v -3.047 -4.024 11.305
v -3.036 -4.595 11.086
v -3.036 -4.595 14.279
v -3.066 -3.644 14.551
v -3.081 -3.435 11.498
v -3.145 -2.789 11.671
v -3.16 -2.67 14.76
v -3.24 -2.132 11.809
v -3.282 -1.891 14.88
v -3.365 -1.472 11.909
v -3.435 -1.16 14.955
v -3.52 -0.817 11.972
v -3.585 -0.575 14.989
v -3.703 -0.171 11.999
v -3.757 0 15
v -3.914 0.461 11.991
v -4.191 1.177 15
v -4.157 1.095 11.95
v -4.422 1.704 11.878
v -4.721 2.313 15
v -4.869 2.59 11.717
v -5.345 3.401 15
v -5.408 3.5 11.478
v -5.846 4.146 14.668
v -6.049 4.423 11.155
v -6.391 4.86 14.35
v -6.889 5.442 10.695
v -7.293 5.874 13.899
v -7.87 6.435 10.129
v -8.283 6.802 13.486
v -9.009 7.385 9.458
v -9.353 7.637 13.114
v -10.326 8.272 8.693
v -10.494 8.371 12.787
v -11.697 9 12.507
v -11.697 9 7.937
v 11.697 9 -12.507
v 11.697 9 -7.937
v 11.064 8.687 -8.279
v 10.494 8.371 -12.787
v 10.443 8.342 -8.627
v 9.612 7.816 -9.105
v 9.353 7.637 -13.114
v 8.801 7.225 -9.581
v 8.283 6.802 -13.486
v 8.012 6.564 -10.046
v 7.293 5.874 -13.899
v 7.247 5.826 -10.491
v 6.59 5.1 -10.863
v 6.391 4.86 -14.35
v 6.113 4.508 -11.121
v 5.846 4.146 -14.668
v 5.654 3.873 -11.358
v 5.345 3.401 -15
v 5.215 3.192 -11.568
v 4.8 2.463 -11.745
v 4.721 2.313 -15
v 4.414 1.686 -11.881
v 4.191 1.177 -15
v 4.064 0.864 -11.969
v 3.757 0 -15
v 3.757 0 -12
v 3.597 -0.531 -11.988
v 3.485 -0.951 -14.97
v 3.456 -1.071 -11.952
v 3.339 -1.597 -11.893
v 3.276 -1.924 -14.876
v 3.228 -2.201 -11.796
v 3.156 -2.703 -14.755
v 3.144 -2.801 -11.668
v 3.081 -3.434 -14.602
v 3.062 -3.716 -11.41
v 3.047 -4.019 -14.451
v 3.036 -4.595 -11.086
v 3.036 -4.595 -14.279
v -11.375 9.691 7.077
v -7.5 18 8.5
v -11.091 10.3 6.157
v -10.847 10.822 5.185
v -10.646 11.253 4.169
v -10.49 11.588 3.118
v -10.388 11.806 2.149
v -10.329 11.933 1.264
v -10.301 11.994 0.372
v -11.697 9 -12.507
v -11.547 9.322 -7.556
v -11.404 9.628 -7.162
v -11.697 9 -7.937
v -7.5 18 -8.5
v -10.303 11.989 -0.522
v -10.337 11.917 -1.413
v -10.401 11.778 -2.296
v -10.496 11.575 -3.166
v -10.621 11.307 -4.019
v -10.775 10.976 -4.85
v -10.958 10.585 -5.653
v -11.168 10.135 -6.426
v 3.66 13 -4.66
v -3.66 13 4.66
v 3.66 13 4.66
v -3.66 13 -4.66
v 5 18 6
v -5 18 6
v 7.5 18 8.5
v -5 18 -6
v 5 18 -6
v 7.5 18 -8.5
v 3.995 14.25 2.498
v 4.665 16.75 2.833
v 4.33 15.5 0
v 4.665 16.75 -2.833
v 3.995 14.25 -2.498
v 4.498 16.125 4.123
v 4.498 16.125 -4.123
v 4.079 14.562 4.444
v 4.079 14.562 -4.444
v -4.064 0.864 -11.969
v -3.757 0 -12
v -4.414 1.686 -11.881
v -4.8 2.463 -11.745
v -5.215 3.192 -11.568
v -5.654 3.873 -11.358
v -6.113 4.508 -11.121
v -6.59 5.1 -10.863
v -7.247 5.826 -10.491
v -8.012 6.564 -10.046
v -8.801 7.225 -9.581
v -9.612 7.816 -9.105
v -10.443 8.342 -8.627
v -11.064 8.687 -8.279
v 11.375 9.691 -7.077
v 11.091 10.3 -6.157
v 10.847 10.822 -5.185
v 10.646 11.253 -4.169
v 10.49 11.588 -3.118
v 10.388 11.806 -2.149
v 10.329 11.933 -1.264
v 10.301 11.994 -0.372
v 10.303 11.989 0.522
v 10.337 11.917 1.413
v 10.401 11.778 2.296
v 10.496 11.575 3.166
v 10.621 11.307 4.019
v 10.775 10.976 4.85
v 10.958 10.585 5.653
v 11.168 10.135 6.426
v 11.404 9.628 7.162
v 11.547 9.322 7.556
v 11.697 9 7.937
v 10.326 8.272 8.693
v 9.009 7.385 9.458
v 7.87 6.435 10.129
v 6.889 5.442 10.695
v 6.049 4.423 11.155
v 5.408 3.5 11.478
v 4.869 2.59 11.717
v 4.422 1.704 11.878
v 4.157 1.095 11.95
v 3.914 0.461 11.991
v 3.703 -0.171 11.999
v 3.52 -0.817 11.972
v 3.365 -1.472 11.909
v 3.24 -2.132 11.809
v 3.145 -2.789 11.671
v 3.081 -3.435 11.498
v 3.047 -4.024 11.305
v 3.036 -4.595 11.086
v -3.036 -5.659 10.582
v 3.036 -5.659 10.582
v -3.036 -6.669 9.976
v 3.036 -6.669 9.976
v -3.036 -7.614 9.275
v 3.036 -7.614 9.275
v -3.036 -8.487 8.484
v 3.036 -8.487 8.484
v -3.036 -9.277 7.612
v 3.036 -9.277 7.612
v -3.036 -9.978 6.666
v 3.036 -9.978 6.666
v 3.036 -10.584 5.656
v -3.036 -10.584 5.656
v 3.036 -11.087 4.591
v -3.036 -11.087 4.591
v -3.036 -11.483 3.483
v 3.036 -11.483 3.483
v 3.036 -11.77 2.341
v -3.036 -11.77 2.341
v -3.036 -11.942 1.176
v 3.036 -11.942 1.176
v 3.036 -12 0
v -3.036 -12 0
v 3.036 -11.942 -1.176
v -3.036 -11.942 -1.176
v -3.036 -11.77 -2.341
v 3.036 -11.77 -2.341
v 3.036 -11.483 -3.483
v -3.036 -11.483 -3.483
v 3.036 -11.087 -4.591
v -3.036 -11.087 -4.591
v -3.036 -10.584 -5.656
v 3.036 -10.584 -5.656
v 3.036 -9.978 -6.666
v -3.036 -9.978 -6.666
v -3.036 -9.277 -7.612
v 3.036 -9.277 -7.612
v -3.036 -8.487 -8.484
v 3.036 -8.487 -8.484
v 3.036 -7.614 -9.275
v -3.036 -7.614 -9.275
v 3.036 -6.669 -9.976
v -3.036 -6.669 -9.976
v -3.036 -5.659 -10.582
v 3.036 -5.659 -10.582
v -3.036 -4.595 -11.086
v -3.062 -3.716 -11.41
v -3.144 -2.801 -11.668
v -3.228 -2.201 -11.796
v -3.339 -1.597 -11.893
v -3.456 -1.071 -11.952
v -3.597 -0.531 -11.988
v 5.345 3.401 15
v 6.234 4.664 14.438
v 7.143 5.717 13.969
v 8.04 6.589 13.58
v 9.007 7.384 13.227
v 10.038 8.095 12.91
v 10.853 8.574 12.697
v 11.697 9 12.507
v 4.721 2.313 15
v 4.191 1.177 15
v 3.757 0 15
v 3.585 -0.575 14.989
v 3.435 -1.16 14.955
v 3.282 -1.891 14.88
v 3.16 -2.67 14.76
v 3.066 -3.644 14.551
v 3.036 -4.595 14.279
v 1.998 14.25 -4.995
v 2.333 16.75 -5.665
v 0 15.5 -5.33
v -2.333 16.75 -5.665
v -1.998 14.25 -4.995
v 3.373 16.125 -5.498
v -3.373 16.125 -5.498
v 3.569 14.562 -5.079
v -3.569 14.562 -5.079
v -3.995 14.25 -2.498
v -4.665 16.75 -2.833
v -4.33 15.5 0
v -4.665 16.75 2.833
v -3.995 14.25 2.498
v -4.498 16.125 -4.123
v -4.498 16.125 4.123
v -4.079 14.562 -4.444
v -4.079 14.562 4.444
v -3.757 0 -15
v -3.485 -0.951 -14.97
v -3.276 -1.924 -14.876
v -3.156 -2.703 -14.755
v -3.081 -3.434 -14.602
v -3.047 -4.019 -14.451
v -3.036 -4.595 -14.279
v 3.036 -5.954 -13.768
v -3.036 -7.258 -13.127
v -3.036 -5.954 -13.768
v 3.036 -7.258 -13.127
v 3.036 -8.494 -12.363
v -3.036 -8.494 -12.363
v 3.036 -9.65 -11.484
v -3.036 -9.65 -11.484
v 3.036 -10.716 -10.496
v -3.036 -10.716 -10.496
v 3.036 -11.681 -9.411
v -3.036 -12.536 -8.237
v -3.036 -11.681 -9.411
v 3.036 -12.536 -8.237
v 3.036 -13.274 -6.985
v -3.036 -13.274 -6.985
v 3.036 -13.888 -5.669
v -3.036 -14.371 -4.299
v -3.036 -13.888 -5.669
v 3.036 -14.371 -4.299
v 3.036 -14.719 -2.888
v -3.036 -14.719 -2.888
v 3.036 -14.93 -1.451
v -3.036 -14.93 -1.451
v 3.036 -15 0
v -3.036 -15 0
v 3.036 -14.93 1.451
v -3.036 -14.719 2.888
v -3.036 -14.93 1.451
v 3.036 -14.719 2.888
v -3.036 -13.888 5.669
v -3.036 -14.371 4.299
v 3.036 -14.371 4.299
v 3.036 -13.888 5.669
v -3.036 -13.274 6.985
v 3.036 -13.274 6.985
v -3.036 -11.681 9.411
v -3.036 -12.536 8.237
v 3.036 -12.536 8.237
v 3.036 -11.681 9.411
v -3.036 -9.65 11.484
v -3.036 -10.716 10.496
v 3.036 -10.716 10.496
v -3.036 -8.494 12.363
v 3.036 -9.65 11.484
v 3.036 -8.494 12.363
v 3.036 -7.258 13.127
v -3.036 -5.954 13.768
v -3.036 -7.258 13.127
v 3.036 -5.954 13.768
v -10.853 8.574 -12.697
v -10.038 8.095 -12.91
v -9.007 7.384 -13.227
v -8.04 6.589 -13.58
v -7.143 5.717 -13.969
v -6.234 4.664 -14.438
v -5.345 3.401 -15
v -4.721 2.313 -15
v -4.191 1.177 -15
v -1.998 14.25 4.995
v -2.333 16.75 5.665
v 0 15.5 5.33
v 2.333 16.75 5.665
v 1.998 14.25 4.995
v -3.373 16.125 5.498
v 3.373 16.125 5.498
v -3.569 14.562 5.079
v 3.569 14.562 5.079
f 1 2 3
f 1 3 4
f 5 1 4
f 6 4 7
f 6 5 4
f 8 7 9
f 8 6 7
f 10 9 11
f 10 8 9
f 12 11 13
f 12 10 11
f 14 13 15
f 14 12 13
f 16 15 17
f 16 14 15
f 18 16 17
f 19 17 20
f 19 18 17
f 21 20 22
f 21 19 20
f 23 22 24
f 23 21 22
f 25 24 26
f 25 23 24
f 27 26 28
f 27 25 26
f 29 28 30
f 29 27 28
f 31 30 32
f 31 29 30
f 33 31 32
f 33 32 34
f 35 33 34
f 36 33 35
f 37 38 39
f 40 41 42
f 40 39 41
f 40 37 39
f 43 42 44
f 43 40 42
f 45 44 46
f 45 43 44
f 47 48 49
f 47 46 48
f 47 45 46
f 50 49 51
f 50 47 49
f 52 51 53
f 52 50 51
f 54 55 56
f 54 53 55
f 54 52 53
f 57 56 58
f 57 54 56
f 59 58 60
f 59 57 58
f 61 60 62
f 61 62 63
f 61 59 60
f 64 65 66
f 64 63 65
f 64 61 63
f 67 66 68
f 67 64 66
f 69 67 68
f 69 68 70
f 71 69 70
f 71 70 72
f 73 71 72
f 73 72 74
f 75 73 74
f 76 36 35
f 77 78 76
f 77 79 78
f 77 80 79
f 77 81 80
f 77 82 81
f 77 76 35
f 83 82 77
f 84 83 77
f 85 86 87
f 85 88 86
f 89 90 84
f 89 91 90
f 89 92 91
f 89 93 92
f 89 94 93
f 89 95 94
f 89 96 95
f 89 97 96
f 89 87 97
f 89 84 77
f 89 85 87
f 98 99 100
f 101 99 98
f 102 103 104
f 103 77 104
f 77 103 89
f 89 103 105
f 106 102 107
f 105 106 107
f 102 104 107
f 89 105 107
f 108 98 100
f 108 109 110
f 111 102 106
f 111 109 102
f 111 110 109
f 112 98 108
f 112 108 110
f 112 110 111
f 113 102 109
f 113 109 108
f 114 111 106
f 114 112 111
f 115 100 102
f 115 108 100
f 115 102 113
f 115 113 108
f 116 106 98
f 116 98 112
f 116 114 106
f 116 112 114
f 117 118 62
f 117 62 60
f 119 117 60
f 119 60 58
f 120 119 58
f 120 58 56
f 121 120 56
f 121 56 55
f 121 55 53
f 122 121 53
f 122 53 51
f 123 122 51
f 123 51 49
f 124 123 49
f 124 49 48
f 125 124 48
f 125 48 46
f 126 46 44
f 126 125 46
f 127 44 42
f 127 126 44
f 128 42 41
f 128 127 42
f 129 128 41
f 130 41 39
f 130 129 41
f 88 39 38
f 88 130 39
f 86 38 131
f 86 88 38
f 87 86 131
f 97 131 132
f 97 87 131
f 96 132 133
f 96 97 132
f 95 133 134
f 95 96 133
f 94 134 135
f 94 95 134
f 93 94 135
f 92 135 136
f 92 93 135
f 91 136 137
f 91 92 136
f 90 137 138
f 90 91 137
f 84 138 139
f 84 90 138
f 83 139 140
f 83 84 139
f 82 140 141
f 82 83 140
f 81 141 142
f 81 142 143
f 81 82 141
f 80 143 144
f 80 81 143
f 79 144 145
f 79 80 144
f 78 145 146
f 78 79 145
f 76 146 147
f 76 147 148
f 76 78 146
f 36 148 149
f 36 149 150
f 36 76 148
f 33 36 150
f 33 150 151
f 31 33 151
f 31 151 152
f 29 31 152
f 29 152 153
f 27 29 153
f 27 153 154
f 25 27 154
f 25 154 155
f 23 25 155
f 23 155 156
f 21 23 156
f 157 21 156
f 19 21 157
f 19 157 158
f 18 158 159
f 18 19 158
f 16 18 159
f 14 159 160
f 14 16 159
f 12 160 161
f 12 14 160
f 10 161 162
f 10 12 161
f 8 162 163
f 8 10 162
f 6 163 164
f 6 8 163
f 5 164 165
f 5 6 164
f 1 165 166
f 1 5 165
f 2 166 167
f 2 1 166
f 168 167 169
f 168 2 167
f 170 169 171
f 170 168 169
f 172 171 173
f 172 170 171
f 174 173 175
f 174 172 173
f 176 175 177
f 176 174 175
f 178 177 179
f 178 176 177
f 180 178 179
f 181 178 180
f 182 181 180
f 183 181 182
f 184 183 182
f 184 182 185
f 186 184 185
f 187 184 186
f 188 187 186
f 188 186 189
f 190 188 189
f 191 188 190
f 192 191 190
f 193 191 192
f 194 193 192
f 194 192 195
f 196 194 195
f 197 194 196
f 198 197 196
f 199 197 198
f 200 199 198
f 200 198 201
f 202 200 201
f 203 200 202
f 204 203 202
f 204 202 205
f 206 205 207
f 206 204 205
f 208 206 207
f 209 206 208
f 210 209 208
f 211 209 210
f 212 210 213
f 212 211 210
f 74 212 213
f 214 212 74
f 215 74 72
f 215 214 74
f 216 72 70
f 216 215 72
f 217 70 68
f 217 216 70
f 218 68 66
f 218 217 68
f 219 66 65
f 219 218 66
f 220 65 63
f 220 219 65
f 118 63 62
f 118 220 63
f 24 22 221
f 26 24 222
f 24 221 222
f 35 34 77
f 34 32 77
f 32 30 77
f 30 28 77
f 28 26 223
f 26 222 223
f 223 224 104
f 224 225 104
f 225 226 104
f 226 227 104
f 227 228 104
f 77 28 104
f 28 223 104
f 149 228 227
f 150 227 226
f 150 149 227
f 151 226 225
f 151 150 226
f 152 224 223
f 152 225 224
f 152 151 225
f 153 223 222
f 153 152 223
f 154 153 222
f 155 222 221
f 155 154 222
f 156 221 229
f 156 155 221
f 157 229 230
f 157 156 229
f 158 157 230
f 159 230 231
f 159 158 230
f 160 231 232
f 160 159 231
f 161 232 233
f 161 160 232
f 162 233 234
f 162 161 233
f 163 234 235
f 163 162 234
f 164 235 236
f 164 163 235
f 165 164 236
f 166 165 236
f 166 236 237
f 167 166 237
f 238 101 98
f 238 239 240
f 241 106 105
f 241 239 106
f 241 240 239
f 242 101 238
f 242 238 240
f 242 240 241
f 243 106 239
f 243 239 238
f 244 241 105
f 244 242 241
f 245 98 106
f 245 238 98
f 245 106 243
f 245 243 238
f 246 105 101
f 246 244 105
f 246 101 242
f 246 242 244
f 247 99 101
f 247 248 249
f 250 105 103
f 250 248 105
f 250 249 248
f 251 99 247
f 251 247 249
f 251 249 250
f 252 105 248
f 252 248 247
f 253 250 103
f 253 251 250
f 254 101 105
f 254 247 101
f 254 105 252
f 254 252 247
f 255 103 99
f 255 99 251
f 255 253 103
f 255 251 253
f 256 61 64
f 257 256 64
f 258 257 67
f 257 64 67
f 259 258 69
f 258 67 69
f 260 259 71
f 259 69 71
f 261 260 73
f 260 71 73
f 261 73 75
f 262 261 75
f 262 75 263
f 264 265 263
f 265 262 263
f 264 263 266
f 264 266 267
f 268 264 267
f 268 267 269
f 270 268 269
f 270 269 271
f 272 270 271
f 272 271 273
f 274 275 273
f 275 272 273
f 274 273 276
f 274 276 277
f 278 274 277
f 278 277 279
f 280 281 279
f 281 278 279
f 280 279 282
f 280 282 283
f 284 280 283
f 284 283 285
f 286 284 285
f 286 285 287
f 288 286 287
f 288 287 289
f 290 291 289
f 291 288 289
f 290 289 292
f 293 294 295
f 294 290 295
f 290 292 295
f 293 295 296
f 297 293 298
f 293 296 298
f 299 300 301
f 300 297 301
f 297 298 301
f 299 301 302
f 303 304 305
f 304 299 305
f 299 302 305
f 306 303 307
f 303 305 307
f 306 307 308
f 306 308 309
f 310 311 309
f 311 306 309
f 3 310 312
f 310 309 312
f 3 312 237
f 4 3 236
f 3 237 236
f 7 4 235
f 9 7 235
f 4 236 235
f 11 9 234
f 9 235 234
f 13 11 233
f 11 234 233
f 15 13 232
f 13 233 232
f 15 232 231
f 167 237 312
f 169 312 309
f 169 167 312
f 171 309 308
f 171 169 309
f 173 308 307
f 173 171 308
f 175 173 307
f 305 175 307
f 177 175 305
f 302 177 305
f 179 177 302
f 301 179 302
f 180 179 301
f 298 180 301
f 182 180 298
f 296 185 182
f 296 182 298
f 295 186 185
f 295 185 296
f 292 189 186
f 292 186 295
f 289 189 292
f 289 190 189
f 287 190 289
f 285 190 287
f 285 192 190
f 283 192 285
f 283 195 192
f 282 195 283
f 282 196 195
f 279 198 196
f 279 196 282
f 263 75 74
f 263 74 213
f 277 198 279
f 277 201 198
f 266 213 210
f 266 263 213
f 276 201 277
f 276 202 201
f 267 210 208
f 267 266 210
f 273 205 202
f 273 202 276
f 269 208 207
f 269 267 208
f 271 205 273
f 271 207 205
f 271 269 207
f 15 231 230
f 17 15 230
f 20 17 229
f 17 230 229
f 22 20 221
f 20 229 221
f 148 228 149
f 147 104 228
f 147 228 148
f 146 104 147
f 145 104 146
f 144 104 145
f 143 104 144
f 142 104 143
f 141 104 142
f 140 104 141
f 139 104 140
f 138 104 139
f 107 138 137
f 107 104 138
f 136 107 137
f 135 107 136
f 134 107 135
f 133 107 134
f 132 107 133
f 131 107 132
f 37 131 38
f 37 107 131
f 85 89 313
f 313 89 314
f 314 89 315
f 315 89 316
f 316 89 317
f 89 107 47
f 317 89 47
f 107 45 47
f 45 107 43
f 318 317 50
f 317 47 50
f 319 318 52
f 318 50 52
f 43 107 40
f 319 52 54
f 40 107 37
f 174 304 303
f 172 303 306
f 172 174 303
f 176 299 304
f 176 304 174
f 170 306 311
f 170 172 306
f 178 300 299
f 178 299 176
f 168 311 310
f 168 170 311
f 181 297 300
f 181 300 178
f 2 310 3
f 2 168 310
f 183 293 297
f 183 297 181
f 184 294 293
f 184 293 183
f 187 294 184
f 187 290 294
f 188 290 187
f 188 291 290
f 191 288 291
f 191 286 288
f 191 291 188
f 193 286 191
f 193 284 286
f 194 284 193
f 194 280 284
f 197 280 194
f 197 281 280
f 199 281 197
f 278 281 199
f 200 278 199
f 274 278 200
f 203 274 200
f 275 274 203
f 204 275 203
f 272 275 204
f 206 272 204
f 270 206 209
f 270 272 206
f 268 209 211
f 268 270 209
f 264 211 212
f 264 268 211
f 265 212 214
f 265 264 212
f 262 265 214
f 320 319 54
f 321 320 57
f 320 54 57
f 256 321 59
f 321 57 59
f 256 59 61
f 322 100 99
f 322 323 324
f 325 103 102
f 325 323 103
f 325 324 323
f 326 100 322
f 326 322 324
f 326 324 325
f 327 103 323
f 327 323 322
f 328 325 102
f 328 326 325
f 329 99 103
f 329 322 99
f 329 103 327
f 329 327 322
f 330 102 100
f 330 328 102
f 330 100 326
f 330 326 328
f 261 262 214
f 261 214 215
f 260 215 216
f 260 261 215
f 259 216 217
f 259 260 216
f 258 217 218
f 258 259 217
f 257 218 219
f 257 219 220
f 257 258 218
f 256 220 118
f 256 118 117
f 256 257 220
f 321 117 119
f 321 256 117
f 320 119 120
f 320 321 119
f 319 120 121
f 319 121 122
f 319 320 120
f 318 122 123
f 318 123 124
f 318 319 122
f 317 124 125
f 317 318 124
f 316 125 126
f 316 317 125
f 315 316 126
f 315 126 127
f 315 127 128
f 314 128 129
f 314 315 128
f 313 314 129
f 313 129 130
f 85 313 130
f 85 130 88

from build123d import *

# Parameters (mm, degrees)
SKETCH_1_R                    = 12
EXTRUDE_1_DEPTH               = 25
CUT_EXTRUDE_1_DEPTH           = 35.263683398
CUT_EXTRUDE_1_DEPTH_BACK      = 35.263683398
SKETCH_2_OUTSIDE_W            = 65.4
SKETCH_2_OUTSIDE_H            = 48.4
SKETCH_3_W                    = 10
SKETCH_3_H                    = 12
CUT_EXTRUDE_2_DEPTH           = 5
CUT_EXTRUDE_2_TAPER           = 15
CUT_EXTRUDE_2_OTHER_WAY_DEPTH = 39.089557823


with BuildPart() as part:
    # 草图1 → 凸台-拉伸1 (new, symmetric)
    with BuildSketch(Plane(origin=(0, 0, 0), x_dir=(0, 0, -1), z_dir=(1, 0, 0))):
        with BuildLine():
            Line((-8.5, 18), (8.5, 18))
            Line((8.5, 18), (15, 3.40076097))
            Line((15, 3.40076097), (15, 0))
            ThreePointArc((15, 0), (0, -15), (-15, 0))
            Line((-15, 0), (-15, 3.40076097))
            Line((-15, 3.40076097), (-8.5, 18))
        make_face()
        Circle(SKETCH_1_R, mode=Mode.SUBTRACT)
    extrude(amount=EXTRUDE_1_DEPTH, both=True)

    # 草图2 outside → 切除-拉伸1 (cut, two sides: drawn at the far end of the back side and taken through both)
    with BuildSketch(Plane.XY.offset(-CUT_EXTRUDE_1_DEPTH_BACK)):
        with Locations((0, 1.5)):
            Rectangle(SKETCH_2_OUTSIDE_W, SKETCH_2_OUTSIDE_H)
        with BuildLine():
            Line((-7.5, 18), (7.5, 18))
            Line((7.5, 18), (11.696768923, 9))
            ThreePointArc((11.696768923, 9), (5.385171162, 3.46487732), (3.03604285, -4.594616806))
            Line((3.03604285, -4.594616806), (3.03604285, -15))
            Line((3.03604285, -15), (-3.03604285, -15))
            Line((-3.03604285, -15), (-3.03604285, -4.594616806))
            ThreePointArc((-3.03604285, -4.594616806), (-5.385171162, 3.46487732), (-11.696768923, 9))
            Line((-11.696768923, 9), (-7.5, 18))
        make_face(mode=Mode.SUBTRACT)
    extrude(amount=CUT_EXTRUDE_1_DEPTH + CUT_EXTRUDE_1_DEPTH_BACK, mode=Mode.SUBTRACT)

    # 草图3 → 切除-拉伸2 (cut)
    with BuildSketch(Plane(origin=(0, 18, 0), x_dir=(1, 0, 0), z_dir=(0, 1, 0))):
        Rectangle(SKETCH_3_W, SKETCH_3_H)
    extrude(amount=-CUT_EXTRUDE_2_DEPTH, taper=CUT_EXTRUDE_2_TAPER, mode=Mode.SUBTRACT)

    # 草图3 → 切除-拉伸2 other way (cut)
    with BuildSketch(Plane(origin=(0, 18, 0), x_dir=(1, 0, 0), z_dir=(0, 1, 0))):
        Rectangle(SKETCH_3_W, SKETCH_3_H)
    extrude(amount=CUT_EXTRUDE_2_OTHER_WAY_DEPTH, mode=Mode.SUBTRACT)


solid = part.part
